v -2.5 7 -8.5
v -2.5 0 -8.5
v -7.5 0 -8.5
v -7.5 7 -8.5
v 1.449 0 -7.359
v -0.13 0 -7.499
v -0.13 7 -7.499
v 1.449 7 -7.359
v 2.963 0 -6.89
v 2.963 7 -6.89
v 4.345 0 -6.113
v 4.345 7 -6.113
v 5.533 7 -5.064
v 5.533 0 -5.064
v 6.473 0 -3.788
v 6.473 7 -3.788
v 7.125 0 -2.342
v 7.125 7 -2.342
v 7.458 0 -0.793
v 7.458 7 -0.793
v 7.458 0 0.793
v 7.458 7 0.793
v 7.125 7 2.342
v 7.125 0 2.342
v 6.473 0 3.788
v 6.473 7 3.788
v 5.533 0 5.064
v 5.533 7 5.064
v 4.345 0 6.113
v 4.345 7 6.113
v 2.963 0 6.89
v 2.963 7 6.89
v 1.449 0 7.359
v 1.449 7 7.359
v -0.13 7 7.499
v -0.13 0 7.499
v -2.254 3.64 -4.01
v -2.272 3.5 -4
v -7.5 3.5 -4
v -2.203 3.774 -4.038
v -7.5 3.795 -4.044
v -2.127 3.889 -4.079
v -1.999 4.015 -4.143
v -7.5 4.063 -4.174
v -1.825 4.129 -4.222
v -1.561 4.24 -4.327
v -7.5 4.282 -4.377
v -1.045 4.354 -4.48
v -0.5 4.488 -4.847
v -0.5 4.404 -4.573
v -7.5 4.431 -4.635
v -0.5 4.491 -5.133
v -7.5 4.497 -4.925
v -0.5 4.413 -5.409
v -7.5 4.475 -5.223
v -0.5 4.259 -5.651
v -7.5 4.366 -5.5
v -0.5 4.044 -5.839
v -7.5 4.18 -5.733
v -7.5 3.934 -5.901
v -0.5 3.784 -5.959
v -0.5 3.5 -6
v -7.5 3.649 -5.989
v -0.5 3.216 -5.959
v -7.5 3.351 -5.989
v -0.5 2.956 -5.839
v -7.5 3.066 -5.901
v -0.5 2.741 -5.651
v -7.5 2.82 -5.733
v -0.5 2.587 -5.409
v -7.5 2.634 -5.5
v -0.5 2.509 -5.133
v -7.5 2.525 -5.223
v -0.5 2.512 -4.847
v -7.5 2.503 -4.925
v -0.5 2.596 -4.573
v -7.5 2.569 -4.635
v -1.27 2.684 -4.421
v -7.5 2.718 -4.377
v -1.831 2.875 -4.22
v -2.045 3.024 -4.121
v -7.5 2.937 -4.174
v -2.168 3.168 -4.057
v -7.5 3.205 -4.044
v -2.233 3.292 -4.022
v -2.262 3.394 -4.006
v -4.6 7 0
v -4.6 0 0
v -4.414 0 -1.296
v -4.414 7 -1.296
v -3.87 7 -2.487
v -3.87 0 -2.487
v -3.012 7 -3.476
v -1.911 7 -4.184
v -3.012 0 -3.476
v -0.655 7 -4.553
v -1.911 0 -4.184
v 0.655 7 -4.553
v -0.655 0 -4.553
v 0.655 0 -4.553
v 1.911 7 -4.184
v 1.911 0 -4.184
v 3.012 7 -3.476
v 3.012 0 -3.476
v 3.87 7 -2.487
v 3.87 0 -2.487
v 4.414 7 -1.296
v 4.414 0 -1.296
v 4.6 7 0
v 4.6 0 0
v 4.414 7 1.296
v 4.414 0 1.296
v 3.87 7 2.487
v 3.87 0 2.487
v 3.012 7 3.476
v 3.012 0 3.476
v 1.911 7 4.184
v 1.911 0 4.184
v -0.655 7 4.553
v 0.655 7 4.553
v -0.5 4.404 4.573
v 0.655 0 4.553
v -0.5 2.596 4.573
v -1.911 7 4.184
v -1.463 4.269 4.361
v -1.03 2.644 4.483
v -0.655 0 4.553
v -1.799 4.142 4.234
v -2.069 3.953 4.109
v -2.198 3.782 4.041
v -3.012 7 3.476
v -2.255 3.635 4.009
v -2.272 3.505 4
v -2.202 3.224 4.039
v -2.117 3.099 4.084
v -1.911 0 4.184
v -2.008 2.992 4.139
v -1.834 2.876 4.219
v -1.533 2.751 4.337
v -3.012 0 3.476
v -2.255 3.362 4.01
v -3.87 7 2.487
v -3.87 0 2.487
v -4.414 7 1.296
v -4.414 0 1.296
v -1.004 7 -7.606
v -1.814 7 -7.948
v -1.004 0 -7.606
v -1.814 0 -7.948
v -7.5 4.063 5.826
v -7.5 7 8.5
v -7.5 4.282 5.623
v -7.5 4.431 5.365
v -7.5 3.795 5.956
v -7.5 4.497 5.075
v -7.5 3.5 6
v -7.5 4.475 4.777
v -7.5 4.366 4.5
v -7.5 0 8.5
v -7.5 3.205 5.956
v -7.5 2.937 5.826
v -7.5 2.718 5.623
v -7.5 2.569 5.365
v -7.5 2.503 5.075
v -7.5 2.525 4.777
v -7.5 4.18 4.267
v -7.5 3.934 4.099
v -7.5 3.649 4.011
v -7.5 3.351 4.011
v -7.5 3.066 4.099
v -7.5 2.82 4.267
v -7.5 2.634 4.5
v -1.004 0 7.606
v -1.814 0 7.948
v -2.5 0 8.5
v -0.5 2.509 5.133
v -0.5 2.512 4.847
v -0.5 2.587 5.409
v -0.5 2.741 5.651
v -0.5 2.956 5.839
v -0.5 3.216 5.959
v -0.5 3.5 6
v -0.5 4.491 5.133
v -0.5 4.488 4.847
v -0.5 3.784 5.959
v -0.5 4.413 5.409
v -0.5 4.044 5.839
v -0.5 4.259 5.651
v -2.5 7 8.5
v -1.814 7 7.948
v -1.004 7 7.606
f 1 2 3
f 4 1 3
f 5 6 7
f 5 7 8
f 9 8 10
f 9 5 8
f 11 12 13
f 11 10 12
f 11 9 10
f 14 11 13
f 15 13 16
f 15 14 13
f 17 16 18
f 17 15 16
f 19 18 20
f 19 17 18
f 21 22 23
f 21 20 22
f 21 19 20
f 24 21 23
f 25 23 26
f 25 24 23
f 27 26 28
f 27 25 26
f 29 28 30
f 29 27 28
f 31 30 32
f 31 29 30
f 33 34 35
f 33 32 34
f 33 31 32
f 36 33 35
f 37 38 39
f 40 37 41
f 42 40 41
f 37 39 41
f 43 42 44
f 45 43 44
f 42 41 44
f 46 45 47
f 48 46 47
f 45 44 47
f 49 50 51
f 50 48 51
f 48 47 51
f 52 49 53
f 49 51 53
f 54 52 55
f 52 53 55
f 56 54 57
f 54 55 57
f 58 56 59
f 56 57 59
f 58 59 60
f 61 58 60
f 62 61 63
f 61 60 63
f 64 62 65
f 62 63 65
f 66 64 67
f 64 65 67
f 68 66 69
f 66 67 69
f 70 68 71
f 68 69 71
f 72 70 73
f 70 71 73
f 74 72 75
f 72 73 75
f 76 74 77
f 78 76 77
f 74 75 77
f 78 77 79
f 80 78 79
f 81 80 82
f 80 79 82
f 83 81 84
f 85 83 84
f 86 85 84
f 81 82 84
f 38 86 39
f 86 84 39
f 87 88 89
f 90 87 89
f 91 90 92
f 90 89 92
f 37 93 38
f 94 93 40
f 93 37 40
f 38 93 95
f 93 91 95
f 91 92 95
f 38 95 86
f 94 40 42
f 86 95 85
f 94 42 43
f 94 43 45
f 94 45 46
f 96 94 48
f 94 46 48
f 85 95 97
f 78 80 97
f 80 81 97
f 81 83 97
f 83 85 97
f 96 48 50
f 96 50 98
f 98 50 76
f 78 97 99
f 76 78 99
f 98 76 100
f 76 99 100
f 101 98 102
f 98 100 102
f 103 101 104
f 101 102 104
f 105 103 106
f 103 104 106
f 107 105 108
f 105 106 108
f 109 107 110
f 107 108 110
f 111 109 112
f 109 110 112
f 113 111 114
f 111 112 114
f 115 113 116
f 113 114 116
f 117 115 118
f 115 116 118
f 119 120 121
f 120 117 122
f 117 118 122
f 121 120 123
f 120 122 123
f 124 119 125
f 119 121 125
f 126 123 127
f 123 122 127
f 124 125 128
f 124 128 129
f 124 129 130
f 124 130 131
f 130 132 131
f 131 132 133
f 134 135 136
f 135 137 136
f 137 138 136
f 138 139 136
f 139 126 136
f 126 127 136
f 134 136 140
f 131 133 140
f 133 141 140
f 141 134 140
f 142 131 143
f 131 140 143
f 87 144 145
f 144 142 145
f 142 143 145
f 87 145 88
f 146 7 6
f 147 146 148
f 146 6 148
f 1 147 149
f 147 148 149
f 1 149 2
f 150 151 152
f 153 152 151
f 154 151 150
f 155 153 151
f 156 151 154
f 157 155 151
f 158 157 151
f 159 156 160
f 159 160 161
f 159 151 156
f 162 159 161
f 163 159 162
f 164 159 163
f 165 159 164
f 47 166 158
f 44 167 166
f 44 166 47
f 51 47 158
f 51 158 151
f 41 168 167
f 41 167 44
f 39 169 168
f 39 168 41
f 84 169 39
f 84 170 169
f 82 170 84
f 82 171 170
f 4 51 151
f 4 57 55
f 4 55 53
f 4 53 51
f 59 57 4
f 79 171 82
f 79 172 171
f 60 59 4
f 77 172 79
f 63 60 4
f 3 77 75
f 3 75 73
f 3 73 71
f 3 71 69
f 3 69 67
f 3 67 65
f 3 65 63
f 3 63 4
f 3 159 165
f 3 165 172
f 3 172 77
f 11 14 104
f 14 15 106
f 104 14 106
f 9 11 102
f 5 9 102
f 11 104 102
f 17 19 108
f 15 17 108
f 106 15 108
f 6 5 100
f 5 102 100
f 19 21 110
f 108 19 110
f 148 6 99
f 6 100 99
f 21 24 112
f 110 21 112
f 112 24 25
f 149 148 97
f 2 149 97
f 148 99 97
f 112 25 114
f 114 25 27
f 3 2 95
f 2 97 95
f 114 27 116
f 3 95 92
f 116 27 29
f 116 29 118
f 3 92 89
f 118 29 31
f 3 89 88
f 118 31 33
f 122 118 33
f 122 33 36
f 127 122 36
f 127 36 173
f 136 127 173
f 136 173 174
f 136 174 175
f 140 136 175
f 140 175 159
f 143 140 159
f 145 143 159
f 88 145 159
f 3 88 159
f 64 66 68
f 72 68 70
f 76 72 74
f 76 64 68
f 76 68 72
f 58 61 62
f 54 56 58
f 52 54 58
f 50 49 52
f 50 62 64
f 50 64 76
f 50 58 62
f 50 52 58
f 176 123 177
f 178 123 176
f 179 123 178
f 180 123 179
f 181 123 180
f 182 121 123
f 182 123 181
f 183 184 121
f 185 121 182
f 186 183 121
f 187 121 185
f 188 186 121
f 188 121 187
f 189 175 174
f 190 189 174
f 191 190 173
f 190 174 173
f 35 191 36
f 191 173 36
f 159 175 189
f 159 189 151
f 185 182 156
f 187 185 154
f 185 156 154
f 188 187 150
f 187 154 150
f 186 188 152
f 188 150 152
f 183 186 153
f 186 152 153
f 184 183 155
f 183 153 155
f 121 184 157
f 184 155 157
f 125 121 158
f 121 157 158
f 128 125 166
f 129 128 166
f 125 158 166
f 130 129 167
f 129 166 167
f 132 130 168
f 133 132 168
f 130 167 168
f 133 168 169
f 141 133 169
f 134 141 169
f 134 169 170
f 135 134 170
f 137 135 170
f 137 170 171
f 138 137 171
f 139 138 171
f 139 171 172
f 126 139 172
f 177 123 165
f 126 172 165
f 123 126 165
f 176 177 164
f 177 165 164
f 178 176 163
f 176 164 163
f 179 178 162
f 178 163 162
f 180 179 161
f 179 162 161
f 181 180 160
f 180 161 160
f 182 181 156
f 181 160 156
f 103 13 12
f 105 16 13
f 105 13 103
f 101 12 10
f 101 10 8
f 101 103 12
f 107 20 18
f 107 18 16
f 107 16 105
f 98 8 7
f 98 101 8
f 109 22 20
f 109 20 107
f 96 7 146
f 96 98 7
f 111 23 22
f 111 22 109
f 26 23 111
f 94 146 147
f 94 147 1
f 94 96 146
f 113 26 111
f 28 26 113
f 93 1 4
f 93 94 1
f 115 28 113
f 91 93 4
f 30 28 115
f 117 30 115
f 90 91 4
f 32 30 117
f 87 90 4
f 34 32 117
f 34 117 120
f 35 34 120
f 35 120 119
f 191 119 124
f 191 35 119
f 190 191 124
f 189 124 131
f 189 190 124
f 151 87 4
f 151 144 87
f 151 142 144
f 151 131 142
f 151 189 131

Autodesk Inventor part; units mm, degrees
ref_plane "YZ Plane" through (0, 0, 0) normal (1, 0, 0) x (0, 1, 0)
ref_plane "XZ Plane" through (0, 0, 0) normal (0, 1, 0) x (-1, 0, 0)
ref_plane "XY Plane" through (0, 0, 0) normal (0, 0, 1) x (1, 0, 0)
sketch "Sketch1" plane through (0, 0, 0) normal (0, 1, 0) x (-1, 0, 0)
  circle A0 centre (0, 0) radius 4.6
  circle A1 centre (0, 0) radius 5.5
  line L0 (0, 5.5) -> (7.5, 5.5)
  line L1 (7.5, 5.5) -> (7.5, -5.5)
  line L2 (7.5, -5.5) -> (0, -5.5)
  line L3 (0, -5.5) -> (0, 5.5)
  line L4 (7.5, 5.5) -> (2.5, 5.5)
  line L5 (2.5, 5.5) -> (2.5, 8.5)
  line L6 (2.5, 8.5) -> (7.5, 8.5)
  line L7 (7.5, 8.5) -> (7.5, 5.5)
  line L8 (7.5, -5.5) -> (2.5, -5.5)
  line L9 (2.5, -5.5) -> (2.5, -8.5)
  line L10 (2.5, -8.5) -> (7.5, -8.5)
  line L11 (7.5, -8.5) -> (7.5, -5.5)
  circle A2 centre (0, 0) radius 7.5
  point P0 (2.5, -5.5)
  point P1 (2.5, 7.0711)
  point P2 (2.5, -7.0711)
  dimension "d1" = 11
  dimension "d0" = 9.2
  dimension "d2" = 5
  dimension "d3" = 3
  dimension "d4" = 5
  dimension "d5" = 3
extrude "Extrusion1" add sketch "Sketch1" along normal blind 7 contours A0 L3 A1 | A0 L3 A1 | L0 A2 L2 A1 | A1 L2 L9 A2 L5 L0 | L5 A2 L0 | L2 A2 L9 | A2 L5 L6 L7 L0 | L0 L1 A2 | A2 L1 L2 | L2 L11 L10 L9 A2
fillet "Fillet1" radius 3.175 2 edges at (-2.5, 3.5, -7.0711) (-2.5, 3.5, 7.0711)
sketch "Sketch2" plane through (-7.5, 0, -8.5) normal (-1, 0, 0) x (0, 0, 1)
  line L0 (0, 7) -> (17, 7) projected
  line L1 (0, 7) -> (3.5, 7)
  line L2 (3.5, 7) -> (13.5, 7)
  line L3 (3.5, 7) -> (3.5, 3.5)
  line L4 (0, 0) -> (17, 0) projected
  line L5 (13.5, 7) -> (13.5, 3.5)
  circle A0 centre (3.5, 3.5) radius 1
  circle A1 centre (13.5, 3.5) radius 1
  point P0 (8.5, 0)
  dimension "d9" = 3.5
  dimension "d10" = 10
  dimension "d11" = 3.5
  dimension "d12" = 3.5
  dimension "d13" = 2
  dimension "d14" = 2
extrude "Extrusion2" cut sketch "Sketch2" against normal blind 7
properties part number "screw_support"
